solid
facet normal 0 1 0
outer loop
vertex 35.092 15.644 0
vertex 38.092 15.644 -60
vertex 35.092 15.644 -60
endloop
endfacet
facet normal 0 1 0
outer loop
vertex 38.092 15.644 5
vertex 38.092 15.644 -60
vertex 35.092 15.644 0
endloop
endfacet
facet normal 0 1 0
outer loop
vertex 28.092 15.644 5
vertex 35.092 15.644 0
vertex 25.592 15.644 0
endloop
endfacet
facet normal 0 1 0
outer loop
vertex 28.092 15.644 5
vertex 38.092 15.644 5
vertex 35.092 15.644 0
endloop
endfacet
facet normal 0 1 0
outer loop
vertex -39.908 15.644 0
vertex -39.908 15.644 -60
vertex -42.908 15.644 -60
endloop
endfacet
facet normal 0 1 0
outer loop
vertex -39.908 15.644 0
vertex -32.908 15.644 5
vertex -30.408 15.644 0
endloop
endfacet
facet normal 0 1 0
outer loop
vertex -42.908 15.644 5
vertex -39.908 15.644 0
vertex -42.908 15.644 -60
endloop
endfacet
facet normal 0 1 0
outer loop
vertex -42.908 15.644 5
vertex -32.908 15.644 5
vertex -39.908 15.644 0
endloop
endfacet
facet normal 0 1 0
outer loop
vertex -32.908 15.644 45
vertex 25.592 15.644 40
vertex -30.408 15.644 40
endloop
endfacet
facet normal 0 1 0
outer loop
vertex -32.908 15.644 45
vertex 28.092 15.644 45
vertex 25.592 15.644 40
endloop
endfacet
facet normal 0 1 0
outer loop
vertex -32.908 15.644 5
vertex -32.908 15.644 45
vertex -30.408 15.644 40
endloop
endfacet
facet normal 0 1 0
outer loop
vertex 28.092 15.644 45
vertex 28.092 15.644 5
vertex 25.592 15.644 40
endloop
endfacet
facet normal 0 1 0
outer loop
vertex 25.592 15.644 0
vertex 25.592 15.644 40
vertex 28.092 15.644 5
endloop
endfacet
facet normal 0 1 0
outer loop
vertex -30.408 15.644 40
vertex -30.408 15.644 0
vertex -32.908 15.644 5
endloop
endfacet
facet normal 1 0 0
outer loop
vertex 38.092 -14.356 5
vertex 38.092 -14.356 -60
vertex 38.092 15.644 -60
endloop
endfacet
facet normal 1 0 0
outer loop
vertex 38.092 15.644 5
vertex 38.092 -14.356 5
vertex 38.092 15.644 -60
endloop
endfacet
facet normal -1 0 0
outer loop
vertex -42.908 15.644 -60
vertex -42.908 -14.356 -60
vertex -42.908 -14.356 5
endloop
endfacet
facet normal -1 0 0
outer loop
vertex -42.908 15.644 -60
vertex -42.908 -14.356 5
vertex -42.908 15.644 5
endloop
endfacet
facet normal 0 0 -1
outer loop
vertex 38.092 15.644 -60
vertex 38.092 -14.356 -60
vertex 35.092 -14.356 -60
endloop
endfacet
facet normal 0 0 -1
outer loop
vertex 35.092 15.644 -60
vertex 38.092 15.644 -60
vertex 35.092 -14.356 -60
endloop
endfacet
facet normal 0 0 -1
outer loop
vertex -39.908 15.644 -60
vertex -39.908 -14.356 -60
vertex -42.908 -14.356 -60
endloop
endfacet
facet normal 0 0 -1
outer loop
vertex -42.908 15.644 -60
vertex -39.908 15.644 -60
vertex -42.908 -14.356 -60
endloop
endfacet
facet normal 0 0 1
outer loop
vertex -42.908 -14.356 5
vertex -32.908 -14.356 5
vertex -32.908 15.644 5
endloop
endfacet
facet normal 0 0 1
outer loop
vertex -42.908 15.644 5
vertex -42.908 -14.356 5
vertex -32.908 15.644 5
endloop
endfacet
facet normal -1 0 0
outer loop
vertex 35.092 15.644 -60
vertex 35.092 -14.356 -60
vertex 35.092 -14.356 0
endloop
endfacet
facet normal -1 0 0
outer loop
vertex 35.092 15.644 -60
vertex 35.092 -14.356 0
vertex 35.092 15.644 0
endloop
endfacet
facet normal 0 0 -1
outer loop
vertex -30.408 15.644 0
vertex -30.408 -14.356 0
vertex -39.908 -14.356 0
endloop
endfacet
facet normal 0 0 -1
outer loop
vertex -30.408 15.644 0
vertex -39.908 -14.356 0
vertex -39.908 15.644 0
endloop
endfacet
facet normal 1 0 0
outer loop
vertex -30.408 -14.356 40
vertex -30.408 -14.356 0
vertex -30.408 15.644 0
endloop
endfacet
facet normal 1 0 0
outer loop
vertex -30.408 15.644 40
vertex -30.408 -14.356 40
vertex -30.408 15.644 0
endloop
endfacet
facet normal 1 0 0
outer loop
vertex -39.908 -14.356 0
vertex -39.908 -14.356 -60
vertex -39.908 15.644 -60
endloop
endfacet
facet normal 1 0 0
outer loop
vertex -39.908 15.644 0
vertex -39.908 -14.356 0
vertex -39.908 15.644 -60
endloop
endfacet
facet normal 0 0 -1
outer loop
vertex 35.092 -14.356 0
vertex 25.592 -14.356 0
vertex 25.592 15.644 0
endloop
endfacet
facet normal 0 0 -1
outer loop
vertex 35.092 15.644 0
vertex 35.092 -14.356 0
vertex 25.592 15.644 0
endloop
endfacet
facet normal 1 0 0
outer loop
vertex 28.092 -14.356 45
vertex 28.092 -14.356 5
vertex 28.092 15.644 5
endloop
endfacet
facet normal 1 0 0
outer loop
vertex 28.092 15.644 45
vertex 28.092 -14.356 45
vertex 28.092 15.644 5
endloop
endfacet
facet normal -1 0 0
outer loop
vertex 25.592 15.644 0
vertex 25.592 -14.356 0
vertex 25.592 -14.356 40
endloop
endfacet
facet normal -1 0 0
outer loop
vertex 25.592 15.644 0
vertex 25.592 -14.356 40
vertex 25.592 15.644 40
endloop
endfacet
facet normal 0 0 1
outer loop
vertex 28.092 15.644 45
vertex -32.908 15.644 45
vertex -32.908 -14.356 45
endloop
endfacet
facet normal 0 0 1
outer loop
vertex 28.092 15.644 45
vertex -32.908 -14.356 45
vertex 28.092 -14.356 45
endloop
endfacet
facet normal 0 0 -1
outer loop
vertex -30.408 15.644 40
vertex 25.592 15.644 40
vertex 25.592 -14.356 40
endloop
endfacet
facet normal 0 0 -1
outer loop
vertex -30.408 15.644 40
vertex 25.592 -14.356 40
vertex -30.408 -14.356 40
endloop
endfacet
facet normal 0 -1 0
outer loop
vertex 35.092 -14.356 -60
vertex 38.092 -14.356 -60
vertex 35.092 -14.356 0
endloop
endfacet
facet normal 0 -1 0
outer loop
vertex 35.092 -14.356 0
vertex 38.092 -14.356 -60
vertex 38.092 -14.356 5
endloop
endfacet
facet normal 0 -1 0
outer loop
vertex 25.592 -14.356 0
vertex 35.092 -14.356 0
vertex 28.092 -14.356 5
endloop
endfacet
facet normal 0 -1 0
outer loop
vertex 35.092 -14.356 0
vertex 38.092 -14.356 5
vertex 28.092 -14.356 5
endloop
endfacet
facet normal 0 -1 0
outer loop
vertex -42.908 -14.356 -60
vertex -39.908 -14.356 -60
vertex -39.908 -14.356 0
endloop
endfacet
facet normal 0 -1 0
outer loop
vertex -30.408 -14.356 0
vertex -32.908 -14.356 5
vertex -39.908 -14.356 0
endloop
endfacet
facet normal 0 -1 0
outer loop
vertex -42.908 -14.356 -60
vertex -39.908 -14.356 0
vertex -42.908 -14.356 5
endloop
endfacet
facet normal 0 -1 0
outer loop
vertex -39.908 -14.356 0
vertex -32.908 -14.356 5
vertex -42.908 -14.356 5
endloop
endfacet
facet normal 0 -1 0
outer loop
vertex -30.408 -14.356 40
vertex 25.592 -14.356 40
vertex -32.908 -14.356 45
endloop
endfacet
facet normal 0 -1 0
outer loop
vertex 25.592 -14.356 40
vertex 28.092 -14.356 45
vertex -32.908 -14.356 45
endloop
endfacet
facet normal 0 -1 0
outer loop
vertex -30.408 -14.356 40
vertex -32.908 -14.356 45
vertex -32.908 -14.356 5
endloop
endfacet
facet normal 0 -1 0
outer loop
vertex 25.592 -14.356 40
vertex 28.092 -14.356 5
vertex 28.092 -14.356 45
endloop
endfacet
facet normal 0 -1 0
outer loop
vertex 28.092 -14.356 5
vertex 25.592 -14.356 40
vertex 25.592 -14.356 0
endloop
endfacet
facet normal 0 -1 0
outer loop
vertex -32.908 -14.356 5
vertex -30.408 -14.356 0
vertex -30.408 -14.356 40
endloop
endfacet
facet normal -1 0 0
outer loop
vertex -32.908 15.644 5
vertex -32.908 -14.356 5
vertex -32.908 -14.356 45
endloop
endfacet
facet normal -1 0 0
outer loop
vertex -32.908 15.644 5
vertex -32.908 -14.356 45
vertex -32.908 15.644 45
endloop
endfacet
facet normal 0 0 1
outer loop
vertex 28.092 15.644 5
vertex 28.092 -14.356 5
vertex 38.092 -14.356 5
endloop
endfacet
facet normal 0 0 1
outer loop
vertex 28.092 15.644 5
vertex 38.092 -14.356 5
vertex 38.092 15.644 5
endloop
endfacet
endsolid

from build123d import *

# Parameters (mm, degrees)
ESQUISSE1_W             = 61
ESQUISSE1_H             = 30
BOSS_EXTRU_1_DEPTH      = 45
ESQUISSE2_W             = 56
ESQUISSE2_H             = 30
ENL_V_MAT_EXTRU_1_DEPTH = 40
ESQUISSE3_W             = 5
ESQUISSE3_H             = 30
BOSS_EXTRU_2_DEPTH      = 10
ESQUISSE4_W             = 5
ESQUISSE4_H             = 30
BOSS_EXTRU_3_DEPTH      = 10
ESQUISSE5_W             = 3
ESQUISSE5_H             = 30
BOSS_EXTRU_4_DEPTH      = 60
ESQUISSE6_W             = 3
ESQUISSE6_H             = 30
BOSS_EXTRU_5_DEPTH      = 60


with BuildPart() as part:
    # Esquisse1 → Boss.-Extru.1 (new body)
    with BuildSketch(Plane.XY):
        with Locations((-2.408366894, 0.644052045)):
            Rectangle(ESQUISSE1_W, ESQUISSE1_H)
    extrude(amount=BOSS_EXTRU_1_DEPTH)

    # Esquisse2 → Enlèv. mat.-Extru.1 (cut)
    with BuildSketch(Plane(origin=(0, 0, 0), x_dir=(-1, 0, 0), z_dir=(0, 0, -1))):
        with Locations((2.408366894, 0.644052045)):
            Rectangle(ESQUISSE2_W, ESQUISSE2_H)
    extrude(amount=-ENL_V_MAT_EXTRU_1_DEPTH, mode=Mode.SUBTRACT)

    # Esquisse3 → Boss.-Extru.2 (add)
    with BuildSketch(Plane(origin=(28.091633106, 0, 0), x_dir=(0, 0, -1), z_dir=(1, 0, 0))):
        with Locations((-2.5, 0.644052045)):
            Rectangle(ESQUISSE3_W, ESQUISSE3_H)
    extrude(amount=BOSS_EXTRU_2_DEPTH)

    # Esquisse4 → Boss.-Extru.3 (add)
    with BuildSketch(Plane.ZY.offset(32.908366894)):
        with Locations((2.5, 0.644052045)):
            Rectangle(ESQUISSE4_W, ESQUISSE4_H)
    extrude(amount=BOSS_EXTRU_3_DEPTH)

    # Esquisse5 → Boss.-Extru.4 (add)
    with BuildSketch(Plane(origin=(0, 0, 0), x_dir=(-1, 0, 0), z_dir=(0, 0, -1))):
        with Locations((-36.591633106, 0.644052045)):
            Rectangle(ESQUISSE5_W, ESQUISSE5_H)
    extrude(amount=BOSS_EXTRU_4_DEPTH)

    # Esquisse6 → Boss.-Extru.5 (add)
    with BuildSketch(Plane(origin=(0, 0, 0), x_dir=(-1, 0, 0), z_dir=(0, 0, -1))):
        with Locations((41.408366894, 0.644052045)):
            Rectangle(ESQUISSE6_W, ESQUISSE6_H)
    extrude(amount=BOSS_EXTRU_5_DEPTH)


solid = part.part
